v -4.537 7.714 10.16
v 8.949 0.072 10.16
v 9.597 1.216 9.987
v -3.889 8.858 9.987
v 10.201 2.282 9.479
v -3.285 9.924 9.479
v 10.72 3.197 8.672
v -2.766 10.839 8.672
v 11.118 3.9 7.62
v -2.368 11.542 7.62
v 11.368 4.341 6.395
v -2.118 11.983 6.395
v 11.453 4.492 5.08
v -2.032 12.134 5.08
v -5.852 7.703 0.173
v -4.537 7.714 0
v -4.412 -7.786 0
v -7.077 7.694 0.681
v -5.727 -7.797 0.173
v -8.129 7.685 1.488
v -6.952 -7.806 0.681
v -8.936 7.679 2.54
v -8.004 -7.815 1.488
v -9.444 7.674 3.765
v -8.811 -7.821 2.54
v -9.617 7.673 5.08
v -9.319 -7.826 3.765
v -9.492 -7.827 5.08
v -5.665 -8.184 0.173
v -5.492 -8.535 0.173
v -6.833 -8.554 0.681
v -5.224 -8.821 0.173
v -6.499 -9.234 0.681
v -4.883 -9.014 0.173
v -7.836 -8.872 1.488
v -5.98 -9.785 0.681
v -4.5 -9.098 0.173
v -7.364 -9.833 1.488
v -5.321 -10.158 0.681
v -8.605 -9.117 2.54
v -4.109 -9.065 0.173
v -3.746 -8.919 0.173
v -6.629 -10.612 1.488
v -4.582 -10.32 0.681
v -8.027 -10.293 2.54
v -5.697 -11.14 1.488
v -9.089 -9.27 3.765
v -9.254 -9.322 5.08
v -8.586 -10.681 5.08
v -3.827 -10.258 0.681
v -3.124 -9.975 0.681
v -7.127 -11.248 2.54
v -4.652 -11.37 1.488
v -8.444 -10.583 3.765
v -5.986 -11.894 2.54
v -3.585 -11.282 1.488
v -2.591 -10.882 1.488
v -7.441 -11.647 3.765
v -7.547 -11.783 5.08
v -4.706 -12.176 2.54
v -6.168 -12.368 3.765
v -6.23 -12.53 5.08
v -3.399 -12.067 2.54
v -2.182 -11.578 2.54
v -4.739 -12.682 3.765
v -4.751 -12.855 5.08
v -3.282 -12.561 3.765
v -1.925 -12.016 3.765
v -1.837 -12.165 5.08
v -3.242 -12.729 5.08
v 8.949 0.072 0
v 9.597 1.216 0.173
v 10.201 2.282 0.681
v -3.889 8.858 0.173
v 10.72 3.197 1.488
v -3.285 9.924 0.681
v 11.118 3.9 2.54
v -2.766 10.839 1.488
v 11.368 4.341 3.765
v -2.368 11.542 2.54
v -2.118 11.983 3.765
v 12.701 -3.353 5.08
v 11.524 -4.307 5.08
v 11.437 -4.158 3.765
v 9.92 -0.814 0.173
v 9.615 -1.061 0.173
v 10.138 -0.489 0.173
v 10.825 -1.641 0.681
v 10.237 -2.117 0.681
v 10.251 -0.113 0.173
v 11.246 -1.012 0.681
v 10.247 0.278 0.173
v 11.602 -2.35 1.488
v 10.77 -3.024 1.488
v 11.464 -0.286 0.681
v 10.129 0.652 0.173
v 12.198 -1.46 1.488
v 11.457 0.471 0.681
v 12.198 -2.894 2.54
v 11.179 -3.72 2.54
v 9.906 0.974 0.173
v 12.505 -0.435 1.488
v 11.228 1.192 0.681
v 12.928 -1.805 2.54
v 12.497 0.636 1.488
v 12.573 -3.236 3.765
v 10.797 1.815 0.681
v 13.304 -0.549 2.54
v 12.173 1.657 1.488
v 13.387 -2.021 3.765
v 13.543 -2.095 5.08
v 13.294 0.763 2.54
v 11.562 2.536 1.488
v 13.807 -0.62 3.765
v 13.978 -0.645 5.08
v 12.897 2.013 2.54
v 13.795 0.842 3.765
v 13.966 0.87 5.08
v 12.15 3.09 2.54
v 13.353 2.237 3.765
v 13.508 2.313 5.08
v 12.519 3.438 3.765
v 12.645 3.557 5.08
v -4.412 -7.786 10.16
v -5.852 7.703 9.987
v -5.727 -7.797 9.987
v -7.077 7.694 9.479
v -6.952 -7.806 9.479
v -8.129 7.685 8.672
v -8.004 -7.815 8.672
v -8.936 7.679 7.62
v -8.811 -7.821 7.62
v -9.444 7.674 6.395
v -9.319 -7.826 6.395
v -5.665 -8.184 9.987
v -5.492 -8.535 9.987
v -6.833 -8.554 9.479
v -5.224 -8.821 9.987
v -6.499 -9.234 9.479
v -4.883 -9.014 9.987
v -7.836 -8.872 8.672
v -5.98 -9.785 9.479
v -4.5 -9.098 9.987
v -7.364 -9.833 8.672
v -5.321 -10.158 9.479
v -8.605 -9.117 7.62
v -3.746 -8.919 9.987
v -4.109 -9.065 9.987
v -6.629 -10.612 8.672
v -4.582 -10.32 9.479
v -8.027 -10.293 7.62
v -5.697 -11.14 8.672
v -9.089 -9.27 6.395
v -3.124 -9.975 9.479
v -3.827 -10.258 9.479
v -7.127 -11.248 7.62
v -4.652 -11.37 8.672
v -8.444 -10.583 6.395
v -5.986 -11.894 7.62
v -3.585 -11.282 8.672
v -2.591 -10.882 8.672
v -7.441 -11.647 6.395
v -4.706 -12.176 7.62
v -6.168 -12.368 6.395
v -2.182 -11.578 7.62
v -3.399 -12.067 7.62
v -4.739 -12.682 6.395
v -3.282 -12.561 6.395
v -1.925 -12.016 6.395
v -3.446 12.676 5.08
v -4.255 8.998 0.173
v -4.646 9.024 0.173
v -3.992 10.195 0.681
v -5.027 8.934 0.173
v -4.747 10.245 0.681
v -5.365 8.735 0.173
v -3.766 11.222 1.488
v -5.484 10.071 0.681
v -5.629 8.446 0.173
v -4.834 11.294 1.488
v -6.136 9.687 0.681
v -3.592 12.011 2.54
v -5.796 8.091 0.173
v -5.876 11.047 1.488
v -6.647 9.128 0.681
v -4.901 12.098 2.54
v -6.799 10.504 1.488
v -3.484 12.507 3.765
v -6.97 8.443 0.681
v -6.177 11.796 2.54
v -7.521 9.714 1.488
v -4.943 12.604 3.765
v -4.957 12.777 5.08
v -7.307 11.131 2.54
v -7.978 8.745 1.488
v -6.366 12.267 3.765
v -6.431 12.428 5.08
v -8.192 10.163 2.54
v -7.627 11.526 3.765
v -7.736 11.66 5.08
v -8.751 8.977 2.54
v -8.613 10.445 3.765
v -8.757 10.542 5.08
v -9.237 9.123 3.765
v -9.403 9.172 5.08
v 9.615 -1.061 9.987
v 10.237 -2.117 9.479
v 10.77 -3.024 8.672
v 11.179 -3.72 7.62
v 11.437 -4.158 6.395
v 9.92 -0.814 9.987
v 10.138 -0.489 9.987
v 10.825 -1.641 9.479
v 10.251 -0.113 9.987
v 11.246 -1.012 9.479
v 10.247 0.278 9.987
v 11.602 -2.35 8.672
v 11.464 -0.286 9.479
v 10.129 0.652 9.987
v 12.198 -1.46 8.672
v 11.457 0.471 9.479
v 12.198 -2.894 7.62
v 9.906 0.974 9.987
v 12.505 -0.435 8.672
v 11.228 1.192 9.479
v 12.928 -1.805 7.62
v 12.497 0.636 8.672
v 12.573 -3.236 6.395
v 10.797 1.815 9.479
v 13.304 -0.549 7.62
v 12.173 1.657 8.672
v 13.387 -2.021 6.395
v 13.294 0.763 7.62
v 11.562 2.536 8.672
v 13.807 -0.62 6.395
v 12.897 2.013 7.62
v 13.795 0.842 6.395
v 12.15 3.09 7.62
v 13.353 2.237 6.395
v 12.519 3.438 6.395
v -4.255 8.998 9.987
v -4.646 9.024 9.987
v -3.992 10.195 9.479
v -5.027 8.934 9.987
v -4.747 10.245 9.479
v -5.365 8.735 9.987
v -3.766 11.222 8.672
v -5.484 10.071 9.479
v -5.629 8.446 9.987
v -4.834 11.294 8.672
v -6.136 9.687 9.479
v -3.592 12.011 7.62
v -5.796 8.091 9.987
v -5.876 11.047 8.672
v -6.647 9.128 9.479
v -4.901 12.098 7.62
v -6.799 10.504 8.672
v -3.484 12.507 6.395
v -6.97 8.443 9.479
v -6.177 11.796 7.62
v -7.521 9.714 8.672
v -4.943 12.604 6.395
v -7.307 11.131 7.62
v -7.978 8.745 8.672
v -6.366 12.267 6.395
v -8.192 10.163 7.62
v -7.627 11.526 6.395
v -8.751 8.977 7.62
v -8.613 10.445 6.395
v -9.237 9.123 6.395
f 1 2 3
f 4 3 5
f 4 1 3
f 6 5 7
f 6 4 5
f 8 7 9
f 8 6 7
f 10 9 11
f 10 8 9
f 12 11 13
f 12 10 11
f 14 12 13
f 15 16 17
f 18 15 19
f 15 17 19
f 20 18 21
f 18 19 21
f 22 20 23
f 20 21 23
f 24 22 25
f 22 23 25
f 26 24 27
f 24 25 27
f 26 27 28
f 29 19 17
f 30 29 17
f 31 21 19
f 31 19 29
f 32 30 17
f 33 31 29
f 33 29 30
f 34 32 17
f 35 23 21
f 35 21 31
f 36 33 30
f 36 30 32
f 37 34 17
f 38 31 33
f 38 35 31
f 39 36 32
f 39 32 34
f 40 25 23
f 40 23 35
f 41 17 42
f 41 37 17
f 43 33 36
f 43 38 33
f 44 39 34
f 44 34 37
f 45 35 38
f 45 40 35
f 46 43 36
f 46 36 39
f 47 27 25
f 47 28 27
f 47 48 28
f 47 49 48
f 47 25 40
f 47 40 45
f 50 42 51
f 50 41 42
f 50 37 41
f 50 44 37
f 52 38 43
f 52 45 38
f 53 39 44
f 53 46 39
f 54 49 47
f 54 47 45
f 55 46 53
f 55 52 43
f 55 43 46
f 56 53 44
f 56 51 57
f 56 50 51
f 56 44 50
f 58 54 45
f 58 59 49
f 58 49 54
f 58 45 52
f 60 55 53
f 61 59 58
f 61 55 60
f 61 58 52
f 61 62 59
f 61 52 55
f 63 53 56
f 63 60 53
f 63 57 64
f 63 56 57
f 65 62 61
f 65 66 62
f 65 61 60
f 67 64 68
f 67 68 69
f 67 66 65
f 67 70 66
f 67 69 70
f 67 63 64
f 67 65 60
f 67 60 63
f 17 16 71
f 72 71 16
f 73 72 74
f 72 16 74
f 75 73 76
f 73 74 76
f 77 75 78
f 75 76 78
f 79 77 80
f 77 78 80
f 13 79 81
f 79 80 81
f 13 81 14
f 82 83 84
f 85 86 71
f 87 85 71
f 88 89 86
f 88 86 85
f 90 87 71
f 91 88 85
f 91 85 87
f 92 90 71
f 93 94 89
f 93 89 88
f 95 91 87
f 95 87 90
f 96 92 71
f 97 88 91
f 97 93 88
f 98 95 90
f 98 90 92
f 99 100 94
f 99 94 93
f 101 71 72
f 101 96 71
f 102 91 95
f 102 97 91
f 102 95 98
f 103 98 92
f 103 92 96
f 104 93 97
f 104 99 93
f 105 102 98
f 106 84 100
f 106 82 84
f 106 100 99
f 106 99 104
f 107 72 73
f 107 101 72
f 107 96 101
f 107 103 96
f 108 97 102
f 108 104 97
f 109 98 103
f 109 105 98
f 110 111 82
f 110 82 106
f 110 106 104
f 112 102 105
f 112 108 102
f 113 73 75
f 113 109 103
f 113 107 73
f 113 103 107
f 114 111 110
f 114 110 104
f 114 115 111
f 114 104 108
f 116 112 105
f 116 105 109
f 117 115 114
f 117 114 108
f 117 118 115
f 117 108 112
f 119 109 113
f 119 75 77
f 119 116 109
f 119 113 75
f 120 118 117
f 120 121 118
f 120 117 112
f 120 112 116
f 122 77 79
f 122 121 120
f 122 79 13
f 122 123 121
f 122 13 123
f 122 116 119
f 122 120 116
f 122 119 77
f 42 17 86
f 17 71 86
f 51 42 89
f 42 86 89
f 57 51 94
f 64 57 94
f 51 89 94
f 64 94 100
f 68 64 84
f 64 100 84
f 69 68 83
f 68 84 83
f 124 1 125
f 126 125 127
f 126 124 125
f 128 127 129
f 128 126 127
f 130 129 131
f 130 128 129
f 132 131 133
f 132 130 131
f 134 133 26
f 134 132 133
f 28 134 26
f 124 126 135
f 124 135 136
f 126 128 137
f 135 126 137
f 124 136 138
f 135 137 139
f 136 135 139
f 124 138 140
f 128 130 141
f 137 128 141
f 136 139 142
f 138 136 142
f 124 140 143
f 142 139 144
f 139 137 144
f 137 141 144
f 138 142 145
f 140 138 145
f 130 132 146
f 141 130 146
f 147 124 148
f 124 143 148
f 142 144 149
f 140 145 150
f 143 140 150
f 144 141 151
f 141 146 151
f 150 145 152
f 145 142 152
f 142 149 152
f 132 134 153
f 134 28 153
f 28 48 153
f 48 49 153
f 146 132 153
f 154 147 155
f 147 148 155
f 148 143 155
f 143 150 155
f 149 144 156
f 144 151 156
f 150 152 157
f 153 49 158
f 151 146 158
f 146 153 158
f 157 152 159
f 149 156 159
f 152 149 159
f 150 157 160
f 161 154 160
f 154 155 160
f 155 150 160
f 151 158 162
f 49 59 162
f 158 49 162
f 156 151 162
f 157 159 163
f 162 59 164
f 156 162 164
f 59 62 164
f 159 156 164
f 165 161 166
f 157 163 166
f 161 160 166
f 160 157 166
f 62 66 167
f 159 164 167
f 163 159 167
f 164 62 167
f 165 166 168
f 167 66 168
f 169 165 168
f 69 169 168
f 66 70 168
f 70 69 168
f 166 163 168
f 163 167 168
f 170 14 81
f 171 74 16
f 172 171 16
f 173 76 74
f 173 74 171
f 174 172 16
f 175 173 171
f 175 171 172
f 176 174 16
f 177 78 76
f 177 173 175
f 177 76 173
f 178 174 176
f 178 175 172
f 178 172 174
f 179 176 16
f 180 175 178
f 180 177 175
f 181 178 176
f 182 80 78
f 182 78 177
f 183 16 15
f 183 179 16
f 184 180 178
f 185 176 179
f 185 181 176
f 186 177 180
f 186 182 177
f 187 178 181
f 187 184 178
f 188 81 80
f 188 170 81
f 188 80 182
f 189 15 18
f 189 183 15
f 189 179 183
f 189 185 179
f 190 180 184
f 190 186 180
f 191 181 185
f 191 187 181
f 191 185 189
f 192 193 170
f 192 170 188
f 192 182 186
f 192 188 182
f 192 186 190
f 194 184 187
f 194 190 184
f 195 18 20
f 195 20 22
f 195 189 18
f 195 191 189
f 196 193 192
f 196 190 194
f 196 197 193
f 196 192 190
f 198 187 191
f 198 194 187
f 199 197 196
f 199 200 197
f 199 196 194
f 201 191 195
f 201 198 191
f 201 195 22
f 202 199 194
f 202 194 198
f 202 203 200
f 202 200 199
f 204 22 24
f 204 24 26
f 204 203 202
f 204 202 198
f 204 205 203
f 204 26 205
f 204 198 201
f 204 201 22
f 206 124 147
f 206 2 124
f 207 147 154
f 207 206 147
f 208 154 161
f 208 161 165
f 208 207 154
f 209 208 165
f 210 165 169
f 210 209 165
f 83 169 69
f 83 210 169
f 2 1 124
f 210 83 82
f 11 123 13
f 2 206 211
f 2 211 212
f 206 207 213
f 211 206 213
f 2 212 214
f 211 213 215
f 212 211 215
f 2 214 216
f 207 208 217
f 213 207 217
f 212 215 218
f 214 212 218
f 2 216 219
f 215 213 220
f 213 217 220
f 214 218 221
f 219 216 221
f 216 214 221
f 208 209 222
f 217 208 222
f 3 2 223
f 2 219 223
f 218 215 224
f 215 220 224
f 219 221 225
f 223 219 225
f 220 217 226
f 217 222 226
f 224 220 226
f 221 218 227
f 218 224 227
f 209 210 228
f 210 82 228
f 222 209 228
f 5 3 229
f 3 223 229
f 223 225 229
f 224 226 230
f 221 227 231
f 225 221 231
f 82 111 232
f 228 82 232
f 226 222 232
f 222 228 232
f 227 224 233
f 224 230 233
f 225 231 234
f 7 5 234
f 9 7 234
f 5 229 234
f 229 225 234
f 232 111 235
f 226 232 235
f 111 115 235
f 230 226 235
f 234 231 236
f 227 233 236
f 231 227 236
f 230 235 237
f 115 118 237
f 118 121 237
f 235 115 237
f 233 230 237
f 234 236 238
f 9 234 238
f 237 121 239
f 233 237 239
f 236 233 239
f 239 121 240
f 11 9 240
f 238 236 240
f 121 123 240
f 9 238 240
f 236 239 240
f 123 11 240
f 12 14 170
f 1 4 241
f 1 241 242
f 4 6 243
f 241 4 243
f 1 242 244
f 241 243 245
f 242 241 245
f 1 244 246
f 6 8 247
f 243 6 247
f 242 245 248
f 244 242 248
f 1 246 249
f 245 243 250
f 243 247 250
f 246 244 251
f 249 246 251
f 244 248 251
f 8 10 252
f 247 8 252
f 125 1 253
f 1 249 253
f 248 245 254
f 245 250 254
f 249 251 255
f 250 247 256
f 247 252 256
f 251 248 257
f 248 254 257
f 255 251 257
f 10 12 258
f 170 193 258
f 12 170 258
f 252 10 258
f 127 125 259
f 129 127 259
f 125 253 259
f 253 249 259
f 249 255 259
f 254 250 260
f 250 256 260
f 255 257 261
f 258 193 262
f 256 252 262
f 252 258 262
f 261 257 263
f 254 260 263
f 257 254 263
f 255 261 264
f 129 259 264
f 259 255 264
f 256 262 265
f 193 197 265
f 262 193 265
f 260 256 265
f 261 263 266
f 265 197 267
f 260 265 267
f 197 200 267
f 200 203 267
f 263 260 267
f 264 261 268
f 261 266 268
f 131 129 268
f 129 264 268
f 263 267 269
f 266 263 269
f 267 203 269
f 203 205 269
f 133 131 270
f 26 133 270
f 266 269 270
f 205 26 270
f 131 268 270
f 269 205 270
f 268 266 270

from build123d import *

# Parameters (mm, degrees)
F1_DEPTH = 10.16
F2_R     = 5.08
F3_R     = 5.07999


# Not quite as in the source:
# - a fillet or chamfer is up to 0.001 mm smaller than in the source, because OpenCascade refuses the exact size


with BuildPart() as f1:
    # F0 (on Top) → F1 (new body)
    with BuildSketch(Plane.XY):
        Polygon((19.1086118392, 0.1538227311), (-9.6875203124, 16.4716319182), (-9.4210915267, -16.6254546493), align=None)
    extrude(amount=F1_DEPTH)

    # F2
    f2_edges = [f1.edges().sort_by_distance(p)[0] for p in [
        (-9.421092, -16.625455, 5.08),
        (19.108612, 0.153823, 5.08),
        (-9.68752, 16.471632, 5.08),
    ]]
    fillet(f2_edges, radius=F2_R)

    # F3 (radius 5.08 in the source; OpenCascade refuses exactly that, so slightly less here)
    f3_edges = [f1.edges().sort_by_distance(p)[0] for p in [
        (4.84376, -8.235816, 0),
        (-6.916588, -12.205742, 0),
        (14.028776, 0.11293, 0),
        (-9.554306, -0.076911, 0),
        (4.710546, 8.312727, 0),
        (-7.112189, 12.092812, 0),
        (4.84376, -8.235816, 10.16),
        (-6.916588, -12.205742, 10.16),
        (14.028776, 0.11293, 10.16),
        (-9.554306, -0.076911, 10.16),
        (4.710546, 8.312727, 10.16),
        (-7.112189, 12.092812, 10.16),
    ]]
    fillet(f3_edges, radius=F3_R)


solid = f1.part
